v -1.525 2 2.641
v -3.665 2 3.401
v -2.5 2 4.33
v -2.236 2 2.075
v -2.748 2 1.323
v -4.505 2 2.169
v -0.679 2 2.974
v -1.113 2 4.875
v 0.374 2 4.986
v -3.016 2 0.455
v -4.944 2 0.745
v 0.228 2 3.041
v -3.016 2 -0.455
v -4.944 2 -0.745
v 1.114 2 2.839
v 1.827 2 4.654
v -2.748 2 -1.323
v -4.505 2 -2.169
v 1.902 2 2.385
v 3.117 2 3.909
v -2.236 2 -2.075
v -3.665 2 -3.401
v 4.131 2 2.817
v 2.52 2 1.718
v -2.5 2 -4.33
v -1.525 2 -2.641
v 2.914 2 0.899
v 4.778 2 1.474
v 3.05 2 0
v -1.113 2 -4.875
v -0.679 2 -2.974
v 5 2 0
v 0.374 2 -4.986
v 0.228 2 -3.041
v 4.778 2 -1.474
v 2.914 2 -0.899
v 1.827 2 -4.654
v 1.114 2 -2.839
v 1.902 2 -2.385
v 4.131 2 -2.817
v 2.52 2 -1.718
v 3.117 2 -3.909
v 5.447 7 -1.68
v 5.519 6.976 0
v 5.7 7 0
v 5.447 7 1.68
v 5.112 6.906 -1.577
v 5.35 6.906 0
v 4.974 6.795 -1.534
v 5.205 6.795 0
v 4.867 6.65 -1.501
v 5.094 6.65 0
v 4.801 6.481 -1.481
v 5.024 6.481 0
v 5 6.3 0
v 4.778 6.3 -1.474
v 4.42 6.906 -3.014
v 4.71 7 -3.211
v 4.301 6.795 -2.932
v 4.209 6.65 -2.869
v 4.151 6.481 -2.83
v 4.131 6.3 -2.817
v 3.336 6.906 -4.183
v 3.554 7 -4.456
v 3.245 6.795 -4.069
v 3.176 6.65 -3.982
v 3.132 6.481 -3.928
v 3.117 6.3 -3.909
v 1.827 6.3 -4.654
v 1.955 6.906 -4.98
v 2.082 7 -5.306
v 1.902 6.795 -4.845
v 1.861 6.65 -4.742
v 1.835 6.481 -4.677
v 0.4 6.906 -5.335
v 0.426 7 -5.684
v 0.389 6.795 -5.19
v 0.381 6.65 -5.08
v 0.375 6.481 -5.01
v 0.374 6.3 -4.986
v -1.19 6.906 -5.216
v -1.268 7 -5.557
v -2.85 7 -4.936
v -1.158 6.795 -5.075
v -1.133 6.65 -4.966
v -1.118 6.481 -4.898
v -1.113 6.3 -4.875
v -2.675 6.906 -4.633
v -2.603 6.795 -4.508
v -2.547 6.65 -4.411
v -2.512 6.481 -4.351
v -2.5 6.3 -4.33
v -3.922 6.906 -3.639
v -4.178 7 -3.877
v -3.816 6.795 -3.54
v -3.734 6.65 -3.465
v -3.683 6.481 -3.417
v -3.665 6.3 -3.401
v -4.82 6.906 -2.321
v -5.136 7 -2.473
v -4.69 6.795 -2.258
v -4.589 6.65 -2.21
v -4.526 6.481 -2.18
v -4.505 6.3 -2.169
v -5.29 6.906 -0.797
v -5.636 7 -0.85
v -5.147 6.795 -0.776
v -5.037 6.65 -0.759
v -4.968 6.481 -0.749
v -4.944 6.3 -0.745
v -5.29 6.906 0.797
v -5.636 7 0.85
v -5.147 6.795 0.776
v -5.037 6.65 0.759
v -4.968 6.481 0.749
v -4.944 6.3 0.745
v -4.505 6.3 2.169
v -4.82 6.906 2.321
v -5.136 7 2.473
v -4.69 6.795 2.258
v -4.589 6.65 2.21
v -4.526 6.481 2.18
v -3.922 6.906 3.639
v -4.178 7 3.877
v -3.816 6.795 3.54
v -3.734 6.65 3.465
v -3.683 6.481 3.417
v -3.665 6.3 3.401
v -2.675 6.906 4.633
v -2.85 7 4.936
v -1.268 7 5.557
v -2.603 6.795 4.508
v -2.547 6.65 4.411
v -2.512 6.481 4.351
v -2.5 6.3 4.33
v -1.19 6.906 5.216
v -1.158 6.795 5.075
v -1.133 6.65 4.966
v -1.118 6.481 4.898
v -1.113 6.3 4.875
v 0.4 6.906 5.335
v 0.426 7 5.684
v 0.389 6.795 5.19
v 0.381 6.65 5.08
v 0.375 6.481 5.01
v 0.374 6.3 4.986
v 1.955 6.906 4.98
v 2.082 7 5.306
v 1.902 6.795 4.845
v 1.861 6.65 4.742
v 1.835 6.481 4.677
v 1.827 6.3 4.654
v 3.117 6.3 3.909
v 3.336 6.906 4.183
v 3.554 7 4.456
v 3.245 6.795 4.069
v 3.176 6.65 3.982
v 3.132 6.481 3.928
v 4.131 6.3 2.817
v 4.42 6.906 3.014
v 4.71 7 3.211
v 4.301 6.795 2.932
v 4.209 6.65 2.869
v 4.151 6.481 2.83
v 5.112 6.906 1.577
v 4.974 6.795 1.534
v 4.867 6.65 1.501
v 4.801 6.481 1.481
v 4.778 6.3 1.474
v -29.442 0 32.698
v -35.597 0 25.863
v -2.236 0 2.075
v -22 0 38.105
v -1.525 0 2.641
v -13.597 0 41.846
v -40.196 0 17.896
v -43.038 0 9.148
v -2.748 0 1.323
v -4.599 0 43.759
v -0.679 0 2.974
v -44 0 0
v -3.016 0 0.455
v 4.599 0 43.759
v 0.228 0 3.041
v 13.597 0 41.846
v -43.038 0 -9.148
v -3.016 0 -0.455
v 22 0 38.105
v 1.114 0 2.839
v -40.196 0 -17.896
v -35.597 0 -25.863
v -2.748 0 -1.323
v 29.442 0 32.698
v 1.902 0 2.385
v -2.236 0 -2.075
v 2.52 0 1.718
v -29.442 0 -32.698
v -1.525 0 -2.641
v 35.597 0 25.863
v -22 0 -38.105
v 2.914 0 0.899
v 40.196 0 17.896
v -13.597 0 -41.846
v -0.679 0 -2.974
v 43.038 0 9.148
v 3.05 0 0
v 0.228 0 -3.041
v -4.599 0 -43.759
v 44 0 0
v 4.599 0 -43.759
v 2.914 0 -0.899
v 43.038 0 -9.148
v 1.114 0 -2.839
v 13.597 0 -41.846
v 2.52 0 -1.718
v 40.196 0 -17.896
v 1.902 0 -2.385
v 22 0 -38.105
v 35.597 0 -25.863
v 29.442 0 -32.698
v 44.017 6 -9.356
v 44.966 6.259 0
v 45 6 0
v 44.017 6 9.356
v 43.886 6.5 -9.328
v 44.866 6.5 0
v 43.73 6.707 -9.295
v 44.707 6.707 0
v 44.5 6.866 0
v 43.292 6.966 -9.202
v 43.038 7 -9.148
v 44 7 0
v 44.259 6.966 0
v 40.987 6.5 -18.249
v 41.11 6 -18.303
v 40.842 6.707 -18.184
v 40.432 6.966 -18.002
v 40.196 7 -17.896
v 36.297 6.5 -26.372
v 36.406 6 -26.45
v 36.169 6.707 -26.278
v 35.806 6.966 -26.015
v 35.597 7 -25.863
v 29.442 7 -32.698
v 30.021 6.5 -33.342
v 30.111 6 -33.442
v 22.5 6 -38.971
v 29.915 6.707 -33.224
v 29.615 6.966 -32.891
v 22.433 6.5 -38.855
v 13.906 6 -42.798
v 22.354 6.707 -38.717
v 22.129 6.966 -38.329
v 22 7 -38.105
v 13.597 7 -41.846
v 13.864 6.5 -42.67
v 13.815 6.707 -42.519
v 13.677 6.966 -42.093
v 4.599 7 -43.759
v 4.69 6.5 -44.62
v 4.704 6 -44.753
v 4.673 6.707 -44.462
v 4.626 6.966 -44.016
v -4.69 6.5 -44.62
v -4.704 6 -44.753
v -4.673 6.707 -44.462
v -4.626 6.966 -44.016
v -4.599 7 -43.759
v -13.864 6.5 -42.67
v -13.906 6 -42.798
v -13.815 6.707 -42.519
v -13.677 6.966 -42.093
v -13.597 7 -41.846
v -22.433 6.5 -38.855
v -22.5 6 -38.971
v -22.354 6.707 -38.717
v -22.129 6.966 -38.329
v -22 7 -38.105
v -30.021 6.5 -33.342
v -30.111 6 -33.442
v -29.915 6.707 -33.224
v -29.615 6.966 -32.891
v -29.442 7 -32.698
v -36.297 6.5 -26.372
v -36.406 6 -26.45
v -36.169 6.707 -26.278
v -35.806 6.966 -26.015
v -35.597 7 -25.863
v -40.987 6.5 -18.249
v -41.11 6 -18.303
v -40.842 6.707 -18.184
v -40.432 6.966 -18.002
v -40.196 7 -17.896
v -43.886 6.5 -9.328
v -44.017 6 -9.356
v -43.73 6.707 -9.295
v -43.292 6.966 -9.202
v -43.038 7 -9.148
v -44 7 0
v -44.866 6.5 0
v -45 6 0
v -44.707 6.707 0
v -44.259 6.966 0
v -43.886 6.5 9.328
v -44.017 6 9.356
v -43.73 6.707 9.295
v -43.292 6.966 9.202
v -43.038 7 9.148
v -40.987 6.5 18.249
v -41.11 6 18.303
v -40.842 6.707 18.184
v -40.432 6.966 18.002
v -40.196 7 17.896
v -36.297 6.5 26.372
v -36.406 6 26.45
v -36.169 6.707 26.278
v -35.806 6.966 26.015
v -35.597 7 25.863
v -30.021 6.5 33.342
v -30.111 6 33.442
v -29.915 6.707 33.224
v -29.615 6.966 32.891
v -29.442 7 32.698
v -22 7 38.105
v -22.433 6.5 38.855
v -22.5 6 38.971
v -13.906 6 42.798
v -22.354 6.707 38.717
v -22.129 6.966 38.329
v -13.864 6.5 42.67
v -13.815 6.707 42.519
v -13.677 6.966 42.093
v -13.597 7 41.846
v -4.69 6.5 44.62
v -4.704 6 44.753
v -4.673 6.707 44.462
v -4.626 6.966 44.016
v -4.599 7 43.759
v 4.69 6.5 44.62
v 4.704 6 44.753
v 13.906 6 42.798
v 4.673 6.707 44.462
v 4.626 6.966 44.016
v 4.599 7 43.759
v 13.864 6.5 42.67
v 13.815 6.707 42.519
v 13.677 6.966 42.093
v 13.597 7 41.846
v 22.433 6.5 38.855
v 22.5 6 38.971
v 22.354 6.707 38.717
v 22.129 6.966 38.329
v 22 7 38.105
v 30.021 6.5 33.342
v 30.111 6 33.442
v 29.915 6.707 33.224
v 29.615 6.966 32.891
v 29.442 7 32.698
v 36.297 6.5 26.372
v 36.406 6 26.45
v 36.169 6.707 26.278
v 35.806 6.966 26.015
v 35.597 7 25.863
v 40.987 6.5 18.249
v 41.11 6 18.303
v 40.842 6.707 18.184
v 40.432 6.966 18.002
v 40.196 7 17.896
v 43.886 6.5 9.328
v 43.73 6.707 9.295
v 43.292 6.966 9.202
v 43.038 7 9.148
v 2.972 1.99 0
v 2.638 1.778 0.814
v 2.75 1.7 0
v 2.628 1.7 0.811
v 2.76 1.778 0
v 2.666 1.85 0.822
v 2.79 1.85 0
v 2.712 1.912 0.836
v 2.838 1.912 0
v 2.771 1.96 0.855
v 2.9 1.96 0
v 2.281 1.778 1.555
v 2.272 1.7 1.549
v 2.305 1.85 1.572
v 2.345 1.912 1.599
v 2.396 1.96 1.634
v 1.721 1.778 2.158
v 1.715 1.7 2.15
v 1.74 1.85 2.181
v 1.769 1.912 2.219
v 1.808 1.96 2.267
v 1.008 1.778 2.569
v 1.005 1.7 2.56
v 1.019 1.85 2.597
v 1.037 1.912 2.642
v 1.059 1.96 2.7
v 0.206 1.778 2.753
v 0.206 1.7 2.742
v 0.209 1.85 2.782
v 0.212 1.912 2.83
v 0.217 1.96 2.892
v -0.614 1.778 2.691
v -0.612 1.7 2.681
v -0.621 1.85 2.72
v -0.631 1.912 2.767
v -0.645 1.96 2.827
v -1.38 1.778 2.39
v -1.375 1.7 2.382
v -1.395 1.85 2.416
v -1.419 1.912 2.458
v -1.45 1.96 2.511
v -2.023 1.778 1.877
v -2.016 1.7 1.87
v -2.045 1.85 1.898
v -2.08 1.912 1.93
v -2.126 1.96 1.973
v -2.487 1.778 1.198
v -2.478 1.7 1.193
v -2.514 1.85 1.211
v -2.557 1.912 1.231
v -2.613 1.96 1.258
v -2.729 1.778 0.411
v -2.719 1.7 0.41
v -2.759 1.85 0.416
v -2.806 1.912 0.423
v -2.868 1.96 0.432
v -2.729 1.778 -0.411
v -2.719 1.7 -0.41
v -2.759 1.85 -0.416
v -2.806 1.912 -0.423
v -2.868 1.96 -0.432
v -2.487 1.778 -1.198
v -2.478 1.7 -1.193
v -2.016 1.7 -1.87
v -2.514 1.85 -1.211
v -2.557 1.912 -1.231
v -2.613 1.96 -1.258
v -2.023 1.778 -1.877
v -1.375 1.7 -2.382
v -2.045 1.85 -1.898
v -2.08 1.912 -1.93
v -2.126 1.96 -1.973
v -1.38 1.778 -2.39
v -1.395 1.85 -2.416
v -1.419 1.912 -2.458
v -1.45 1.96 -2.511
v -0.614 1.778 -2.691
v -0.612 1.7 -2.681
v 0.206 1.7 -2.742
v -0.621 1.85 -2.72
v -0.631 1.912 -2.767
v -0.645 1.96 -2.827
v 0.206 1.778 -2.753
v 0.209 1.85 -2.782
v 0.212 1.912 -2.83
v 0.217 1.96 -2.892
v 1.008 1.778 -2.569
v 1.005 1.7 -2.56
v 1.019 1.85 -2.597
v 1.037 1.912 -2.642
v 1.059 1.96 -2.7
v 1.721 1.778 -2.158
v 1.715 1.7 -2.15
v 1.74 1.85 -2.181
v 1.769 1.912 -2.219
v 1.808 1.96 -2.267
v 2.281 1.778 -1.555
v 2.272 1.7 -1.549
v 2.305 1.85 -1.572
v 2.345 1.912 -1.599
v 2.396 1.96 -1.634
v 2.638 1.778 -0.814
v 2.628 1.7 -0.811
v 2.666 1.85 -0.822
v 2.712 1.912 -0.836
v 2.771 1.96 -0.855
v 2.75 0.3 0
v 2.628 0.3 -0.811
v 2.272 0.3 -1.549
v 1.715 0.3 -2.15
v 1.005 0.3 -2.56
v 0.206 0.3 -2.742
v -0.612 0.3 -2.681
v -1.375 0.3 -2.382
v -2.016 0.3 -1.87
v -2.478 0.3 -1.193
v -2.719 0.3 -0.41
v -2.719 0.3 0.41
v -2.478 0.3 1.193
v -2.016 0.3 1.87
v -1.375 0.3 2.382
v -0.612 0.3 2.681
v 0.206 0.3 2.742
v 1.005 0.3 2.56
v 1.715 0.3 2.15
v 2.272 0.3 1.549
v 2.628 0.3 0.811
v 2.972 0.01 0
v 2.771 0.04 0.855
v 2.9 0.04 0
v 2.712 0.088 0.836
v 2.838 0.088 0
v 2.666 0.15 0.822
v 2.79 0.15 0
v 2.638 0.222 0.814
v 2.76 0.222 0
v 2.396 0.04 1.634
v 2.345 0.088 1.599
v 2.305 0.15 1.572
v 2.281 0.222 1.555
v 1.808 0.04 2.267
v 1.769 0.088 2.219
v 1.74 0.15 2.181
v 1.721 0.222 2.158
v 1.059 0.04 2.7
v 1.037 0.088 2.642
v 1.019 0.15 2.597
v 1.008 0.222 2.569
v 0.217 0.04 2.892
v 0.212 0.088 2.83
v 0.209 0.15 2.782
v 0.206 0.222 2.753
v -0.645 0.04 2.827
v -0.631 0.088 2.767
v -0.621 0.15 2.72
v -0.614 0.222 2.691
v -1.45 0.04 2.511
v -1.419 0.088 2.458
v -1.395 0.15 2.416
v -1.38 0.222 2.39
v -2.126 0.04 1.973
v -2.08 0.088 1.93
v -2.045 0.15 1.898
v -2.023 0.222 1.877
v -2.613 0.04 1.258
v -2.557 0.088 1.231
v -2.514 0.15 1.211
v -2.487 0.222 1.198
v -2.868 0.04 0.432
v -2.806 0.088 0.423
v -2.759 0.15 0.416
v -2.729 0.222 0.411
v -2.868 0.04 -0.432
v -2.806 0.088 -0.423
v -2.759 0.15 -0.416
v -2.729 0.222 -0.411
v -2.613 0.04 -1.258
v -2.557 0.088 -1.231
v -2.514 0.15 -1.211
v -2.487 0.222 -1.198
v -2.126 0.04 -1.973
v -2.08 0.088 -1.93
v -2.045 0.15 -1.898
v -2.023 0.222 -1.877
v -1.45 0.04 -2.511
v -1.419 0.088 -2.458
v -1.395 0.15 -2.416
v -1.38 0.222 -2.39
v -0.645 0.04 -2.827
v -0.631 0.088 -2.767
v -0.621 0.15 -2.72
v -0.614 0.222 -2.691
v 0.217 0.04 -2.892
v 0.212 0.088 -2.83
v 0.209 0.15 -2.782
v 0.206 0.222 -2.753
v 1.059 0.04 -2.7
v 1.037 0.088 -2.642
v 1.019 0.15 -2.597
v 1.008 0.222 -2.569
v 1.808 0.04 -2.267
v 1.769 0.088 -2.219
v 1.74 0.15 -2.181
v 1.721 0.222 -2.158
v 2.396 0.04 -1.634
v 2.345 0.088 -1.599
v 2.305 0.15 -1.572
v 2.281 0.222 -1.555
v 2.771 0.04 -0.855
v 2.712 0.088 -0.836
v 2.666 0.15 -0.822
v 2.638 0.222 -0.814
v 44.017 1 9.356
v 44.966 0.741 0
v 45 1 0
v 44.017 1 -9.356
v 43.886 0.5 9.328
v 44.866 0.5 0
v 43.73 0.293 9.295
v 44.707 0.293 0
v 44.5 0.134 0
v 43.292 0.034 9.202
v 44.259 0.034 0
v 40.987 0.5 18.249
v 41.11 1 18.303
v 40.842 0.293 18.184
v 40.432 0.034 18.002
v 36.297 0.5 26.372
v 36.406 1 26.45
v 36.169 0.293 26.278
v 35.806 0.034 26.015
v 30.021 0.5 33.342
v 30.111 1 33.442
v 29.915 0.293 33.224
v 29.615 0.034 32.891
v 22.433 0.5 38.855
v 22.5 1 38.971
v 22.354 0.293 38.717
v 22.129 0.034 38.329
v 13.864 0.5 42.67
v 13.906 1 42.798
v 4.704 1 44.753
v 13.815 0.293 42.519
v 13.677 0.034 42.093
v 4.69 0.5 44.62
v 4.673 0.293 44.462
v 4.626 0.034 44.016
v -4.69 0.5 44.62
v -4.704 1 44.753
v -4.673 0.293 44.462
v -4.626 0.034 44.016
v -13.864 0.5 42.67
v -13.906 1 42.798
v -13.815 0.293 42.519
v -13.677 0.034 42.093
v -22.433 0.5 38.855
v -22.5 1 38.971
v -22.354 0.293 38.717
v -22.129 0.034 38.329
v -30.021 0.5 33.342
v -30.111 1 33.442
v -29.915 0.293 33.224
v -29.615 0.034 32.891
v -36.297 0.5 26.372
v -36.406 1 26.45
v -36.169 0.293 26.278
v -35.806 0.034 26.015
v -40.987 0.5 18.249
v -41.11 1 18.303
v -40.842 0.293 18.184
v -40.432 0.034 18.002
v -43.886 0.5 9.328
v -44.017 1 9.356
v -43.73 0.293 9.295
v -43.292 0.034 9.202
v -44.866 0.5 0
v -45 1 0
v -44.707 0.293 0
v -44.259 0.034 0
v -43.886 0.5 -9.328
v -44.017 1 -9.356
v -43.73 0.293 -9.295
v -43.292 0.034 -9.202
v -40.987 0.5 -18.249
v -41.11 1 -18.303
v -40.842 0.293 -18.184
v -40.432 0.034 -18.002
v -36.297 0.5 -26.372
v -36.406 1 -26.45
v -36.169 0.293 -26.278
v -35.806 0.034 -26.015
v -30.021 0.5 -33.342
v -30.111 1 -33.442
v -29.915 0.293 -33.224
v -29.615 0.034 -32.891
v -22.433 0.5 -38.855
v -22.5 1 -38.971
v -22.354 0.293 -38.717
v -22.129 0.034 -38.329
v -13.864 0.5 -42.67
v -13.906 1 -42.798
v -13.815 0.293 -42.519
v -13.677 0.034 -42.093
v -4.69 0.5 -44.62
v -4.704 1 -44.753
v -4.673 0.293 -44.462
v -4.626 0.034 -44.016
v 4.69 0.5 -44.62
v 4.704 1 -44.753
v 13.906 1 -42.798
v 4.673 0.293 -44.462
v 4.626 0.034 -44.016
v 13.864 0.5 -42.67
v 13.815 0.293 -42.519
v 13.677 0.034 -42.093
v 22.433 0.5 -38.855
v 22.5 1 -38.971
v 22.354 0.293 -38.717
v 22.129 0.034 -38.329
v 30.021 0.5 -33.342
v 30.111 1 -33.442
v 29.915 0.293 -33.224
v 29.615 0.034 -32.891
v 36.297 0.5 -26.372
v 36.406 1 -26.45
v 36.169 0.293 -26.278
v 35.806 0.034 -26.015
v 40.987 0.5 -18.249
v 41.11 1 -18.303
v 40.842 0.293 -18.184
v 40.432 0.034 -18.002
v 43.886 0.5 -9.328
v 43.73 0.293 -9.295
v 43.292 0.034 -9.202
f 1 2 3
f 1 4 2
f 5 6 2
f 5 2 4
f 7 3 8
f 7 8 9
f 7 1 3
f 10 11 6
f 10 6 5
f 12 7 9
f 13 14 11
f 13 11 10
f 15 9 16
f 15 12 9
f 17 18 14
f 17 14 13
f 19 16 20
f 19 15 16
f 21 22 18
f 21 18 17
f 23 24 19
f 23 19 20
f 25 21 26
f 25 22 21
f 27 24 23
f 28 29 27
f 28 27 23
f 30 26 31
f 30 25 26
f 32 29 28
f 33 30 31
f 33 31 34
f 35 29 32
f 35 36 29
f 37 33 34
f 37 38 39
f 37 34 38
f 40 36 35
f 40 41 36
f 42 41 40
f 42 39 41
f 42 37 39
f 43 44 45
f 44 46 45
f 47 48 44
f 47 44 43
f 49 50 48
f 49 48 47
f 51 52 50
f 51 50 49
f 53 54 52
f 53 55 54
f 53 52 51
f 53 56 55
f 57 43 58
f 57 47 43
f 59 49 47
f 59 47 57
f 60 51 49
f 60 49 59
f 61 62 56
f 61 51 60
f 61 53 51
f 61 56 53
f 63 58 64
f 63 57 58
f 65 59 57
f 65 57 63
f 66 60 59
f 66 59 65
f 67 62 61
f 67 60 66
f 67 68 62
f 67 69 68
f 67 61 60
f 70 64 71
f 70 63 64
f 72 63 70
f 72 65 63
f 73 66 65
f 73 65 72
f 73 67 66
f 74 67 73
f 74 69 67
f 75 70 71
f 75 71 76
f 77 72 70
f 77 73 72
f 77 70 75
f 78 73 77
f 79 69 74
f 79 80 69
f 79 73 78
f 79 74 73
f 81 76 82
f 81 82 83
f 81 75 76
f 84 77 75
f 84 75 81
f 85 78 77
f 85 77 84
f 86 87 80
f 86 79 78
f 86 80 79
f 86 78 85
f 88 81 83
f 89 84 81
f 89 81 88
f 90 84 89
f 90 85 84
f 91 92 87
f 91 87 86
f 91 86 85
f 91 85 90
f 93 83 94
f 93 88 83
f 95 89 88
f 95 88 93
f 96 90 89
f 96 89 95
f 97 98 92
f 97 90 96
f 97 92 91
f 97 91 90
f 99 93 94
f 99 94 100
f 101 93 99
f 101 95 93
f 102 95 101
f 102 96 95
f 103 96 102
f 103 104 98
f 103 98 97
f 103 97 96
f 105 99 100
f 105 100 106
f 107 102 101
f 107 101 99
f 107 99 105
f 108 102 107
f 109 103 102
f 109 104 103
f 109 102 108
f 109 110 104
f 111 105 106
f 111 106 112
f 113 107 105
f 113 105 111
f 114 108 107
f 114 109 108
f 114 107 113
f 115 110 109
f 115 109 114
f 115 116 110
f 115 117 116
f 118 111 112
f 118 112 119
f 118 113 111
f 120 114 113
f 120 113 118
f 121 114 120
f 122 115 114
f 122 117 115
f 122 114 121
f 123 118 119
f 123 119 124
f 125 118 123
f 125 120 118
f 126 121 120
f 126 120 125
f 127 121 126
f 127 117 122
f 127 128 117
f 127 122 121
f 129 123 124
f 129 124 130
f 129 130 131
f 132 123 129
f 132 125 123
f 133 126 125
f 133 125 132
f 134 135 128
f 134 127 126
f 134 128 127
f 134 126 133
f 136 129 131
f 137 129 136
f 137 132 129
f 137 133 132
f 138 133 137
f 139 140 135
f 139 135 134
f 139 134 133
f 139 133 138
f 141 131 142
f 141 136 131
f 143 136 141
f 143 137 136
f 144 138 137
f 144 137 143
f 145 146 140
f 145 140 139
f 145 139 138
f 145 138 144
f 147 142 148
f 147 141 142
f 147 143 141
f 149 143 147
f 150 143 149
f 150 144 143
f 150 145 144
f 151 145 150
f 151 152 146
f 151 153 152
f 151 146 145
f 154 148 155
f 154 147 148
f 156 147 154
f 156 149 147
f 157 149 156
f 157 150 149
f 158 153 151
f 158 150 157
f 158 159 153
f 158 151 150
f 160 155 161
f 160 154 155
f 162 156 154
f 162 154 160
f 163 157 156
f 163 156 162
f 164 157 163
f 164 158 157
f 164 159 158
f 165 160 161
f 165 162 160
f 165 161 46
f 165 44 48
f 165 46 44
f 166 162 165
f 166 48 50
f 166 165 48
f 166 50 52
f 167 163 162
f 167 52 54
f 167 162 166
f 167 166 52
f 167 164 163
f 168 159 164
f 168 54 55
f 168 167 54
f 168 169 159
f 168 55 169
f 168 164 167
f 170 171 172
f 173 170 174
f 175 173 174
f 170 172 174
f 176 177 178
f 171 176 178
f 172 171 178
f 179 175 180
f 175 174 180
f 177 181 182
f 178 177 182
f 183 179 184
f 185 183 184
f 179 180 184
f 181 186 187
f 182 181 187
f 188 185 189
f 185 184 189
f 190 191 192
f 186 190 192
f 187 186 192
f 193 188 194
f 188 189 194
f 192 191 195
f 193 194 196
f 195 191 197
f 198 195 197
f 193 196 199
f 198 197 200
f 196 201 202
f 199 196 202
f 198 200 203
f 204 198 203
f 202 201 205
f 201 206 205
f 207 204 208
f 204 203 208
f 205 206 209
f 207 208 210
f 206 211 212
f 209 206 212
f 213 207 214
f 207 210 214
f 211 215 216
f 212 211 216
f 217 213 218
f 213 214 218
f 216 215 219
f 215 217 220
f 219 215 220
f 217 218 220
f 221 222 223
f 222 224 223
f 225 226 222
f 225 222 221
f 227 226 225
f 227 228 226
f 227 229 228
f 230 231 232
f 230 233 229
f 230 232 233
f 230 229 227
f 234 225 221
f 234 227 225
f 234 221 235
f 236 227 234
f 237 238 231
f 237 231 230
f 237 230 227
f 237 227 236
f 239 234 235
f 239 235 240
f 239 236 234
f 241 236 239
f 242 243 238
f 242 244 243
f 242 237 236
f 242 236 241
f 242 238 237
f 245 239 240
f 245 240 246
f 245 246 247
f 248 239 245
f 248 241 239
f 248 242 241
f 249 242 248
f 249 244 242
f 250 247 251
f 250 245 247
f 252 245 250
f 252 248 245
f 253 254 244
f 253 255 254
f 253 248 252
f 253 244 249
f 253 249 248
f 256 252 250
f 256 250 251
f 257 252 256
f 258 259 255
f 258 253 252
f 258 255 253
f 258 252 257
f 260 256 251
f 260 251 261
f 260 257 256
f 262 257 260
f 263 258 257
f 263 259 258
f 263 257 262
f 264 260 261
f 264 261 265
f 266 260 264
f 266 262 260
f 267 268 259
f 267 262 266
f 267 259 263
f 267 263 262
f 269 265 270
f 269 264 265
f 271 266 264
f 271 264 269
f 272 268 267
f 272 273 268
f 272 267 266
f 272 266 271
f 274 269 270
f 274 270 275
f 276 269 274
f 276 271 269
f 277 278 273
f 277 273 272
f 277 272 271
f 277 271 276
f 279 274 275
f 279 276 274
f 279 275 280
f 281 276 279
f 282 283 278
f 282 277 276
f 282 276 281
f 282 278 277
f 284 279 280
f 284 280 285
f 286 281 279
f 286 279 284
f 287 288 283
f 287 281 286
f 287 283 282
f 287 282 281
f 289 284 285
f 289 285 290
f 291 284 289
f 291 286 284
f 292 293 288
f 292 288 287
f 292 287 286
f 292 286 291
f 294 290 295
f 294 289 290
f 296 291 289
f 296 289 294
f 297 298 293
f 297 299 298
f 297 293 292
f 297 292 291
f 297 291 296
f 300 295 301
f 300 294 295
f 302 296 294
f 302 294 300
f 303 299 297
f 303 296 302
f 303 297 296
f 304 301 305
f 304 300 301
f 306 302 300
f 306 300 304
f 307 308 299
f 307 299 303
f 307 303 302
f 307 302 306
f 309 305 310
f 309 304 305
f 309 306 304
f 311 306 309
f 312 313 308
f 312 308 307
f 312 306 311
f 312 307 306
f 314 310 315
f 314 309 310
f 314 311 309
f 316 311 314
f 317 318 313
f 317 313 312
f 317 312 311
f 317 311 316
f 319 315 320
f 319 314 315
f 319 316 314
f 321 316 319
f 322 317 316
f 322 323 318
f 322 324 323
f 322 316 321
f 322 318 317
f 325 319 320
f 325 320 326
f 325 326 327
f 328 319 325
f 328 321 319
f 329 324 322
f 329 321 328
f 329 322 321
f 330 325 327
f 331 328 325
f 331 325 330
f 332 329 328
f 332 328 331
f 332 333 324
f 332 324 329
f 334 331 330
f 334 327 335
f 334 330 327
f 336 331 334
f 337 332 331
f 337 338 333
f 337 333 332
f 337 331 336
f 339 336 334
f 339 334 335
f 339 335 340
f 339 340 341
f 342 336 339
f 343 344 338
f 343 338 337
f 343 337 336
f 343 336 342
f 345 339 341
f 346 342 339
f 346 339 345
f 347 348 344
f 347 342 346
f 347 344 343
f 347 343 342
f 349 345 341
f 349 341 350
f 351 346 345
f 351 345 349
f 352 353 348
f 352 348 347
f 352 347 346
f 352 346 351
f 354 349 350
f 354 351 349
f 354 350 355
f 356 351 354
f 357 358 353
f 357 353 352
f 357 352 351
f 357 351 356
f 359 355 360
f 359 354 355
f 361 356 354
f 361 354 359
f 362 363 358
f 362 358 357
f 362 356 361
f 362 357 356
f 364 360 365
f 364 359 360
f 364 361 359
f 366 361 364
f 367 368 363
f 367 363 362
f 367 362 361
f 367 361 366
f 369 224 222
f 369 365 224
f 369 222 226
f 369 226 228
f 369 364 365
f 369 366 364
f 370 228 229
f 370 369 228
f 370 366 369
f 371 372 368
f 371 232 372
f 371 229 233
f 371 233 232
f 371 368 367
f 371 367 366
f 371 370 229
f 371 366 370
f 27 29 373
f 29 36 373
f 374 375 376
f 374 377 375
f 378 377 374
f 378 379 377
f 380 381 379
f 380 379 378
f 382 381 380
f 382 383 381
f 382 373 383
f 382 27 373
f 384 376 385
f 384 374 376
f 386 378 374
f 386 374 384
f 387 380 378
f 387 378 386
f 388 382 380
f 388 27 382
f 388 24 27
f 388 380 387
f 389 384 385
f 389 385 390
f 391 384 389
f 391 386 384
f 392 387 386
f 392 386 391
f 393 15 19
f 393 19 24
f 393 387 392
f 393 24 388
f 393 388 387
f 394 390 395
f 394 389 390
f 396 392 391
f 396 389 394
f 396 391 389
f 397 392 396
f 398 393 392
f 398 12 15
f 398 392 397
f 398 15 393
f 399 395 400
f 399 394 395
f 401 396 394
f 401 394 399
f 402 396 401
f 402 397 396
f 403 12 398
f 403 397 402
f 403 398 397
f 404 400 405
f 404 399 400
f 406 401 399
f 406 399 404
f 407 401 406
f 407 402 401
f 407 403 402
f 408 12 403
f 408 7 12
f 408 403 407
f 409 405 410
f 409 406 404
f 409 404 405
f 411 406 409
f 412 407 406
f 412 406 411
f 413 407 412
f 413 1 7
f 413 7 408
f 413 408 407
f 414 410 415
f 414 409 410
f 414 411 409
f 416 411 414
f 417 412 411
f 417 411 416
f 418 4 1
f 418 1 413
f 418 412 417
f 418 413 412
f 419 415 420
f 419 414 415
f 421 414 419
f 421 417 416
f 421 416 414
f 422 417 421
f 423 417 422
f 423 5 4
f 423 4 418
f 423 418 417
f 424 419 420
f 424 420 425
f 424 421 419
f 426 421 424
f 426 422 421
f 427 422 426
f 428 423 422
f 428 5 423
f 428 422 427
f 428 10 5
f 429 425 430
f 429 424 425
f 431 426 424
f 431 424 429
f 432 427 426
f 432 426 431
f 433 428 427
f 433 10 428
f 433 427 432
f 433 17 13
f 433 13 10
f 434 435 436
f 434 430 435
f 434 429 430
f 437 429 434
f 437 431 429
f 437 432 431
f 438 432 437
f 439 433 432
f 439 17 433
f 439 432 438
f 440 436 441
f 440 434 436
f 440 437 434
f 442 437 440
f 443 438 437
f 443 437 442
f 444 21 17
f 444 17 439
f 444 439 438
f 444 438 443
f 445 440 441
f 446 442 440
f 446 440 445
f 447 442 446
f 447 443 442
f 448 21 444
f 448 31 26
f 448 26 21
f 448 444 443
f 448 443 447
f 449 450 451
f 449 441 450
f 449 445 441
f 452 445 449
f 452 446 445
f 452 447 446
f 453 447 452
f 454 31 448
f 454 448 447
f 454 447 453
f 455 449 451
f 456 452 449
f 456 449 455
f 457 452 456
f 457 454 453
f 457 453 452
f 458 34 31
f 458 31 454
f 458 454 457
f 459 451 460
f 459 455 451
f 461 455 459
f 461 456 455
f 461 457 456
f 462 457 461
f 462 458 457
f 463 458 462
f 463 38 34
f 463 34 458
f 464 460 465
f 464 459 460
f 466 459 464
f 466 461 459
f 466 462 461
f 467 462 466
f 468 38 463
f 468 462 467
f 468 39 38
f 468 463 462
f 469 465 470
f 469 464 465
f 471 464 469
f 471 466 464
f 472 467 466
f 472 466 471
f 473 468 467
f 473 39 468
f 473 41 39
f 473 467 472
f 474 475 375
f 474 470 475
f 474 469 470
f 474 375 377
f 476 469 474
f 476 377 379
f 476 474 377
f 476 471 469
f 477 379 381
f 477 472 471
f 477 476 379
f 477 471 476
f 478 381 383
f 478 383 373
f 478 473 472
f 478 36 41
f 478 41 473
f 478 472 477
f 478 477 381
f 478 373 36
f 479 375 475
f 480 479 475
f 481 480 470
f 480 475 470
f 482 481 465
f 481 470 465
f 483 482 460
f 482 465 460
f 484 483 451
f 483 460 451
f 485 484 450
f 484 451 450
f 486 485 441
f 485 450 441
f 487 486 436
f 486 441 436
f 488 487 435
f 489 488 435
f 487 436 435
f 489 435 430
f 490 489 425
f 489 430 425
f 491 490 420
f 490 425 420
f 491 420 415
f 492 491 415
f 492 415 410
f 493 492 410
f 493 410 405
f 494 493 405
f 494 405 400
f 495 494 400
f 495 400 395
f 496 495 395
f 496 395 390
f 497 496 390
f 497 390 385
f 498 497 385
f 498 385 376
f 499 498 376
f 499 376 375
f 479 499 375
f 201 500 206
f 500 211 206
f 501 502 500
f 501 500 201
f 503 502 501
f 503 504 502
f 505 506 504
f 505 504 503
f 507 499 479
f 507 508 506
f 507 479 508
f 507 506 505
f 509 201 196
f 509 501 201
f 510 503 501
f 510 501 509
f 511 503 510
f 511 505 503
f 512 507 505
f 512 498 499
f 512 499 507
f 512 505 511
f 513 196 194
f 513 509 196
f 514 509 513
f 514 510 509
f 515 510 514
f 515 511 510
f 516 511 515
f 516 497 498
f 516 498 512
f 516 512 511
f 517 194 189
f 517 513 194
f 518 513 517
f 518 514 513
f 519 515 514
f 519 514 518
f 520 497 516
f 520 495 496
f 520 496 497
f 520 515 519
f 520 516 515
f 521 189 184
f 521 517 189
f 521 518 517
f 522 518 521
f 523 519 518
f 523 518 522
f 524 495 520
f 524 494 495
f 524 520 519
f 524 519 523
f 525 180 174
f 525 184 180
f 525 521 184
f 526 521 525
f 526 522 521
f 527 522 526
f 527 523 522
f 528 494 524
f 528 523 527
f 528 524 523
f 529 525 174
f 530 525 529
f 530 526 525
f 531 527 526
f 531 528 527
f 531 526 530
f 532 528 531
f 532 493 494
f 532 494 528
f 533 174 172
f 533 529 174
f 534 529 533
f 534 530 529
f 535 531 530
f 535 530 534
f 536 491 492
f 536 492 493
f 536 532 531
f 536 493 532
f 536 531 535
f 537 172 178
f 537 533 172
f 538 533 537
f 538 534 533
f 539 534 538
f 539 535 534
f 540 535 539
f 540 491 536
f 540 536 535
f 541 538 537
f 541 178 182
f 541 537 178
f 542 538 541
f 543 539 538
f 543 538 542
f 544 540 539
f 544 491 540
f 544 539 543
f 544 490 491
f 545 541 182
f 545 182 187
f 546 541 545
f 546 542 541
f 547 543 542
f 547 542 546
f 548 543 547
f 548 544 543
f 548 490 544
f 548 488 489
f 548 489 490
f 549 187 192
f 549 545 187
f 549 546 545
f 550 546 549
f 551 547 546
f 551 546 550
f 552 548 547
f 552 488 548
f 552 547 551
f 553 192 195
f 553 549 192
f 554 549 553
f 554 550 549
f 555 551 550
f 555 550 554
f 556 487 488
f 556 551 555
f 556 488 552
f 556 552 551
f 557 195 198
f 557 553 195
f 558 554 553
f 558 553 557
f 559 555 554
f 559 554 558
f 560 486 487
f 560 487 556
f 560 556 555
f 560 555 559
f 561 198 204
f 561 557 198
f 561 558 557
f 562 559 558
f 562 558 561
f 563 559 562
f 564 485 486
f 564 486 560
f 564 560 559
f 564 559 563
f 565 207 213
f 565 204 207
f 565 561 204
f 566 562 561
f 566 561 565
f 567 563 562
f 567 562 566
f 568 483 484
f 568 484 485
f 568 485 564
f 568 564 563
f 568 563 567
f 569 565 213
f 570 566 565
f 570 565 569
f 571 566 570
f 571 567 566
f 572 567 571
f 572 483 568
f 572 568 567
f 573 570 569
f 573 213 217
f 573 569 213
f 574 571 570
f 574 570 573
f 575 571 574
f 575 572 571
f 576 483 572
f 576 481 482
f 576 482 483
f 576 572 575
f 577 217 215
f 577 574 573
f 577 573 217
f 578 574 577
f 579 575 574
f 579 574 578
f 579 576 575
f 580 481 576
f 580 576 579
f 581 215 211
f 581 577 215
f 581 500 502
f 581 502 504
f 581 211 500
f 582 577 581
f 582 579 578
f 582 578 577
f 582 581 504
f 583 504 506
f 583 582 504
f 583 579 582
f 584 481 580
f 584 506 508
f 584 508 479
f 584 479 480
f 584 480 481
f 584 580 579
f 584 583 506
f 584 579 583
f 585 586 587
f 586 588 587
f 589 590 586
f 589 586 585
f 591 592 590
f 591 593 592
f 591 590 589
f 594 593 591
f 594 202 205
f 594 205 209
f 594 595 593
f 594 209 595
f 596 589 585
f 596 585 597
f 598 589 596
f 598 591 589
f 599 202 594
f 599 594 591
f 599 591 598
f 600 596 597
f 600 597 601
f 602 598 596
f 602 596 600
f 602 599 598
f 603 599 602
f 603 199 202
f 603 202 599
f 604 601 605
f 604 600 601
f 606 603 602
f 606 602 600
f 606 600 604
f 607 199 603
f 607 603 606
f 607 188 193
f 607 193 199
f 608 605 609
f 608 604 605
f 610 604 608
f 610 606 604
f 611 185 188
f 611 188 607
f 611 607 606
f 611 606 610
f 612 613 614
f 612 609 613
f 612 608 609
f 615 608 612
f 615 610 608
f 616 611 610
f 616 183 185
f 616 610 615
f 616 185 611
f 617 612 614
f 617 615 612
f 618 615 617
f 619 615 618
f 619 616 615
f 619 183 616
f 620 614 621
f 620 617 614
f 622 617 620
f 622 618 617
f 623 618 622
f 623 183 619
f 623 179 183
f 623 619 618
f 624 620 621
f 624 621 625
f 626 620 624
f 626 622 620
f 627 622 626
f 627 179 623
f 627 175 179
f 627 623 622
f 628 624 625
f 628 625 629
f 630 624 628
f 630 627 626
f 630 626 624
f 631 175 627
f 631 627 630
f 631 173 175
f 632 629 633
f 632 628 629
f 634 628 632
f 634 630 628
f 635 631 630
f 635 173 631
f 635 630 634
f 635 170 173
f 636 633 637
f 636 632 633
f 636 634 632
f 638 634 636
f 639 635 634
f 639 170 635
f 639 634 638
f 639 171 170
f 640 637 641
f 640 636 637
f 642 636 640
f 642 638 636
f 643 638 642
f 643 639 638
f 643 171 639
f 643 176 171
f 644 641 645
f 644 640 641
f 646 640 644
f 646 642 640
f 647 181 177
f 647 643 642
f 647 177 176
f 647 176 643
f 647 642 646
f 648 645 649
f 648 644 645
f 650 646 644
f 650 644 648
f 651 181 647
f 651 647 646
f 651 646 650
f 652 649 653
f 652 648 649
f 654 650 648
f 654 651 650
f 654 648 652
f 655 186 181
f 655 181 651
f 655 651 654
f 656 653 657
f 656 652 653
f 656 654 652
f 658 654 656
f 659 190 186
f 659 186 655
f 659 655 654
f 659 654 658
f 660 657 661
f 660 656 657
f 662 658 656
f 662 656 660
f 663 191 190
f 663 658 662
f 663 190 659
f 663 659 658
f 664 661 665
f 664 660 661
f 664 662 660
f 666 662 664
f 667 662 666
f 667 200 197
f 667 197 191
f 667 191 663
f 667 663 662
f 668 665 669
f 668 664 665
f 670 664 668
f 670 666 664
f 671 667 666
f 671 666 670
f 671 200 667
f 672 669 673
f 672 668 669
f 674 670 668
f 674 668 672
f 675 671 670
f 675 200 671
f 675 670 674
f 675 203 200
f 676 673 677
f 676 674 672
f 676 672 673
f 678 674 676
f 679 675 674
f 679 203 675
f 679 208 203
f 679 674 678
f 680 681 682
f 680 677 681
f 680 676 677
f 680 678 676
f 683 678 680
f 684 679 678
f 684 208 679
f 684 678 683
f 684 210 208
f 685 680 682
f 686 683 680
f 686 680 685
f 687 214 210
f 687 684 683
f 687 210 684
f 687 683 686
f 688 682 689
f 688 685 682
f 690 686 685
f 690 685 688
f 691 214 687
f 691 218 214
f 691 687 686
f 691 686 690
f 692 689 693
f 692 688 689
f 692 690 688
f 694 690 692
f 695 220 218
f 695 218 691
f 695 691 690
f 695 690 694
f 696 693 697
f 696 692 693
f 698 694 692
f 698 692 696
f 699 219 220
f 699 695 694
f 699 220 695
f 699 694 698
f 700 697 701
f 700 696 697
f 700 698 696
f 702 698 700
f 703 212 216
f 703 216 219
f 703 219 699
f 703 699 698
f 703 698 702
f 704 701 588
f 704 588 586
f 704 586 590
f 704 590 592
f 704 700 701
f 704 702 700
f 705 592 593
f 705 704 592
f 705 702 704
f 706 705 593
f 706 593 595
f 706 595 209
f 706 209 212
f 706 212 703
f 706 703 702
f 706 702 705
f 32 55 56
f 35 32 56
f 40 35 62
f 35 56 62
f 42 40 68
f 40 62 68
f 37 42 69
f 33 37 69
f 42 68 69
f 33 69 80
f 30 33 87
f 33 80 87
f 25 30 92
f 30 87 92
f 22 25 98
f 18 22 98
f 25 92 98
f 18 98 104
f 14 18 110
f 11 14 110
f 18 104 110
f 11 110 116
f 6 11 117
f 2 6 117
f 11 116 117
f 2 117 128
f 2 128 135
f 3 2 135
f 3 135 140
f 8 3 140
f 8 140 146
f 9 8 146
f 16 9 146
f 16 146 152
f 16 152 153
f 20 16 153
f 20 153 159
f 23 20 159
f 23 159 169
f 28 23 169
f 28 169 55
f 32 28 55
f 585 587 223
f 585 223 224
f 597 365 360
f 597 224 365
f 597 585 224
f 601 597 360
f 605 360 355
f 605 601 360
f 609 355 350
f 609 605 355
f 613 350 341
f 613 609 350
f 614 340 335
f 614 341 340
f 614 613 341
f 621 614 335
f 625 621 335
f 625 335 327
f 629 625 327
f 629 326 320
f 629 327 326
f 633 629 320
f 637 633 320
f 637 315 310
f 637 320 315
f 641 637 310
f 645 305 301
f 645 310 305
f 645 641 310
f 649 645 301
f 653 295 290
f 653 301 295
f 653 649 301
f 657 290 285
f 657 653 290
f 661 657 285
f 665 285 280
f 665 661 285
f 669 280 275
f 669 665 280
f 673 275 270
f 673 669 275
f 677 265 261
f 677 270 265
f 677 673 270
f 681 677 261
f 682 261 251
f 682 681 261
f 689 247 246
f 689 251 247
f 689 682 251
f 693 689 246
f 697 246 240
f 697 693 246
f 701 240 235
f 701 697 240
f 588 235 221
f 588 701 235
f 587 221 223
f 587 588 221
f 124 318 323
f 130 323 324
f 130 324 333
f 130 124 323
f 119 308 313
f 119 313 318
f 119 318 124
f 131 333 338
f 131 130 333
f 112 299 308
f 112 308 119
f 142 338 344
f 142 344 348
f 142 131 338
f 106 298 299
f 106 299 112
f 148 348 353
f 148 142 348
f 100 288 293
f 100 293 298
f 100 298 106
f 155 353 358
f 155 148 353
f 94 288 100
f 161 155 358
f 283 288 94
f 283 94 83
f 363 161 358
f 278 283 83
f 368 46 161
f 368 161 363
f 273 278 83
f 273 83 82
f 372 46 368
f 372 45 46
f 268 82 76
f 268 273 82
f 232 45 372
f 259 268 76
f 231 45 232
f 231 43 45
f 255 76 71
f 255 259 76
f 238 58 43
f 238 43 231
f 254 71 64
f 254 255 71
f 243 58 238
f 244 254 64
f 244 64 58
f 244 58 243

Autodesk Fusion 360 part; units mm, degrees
sketch "Skizze1" plane through (0, 0, 0) normal (0, 1, 0) x (1, 0, 0)
  circle A0 centre (0, 0) radius 45
  dimension "d1" = 90
extrude "Extrusion1" add sketch "Skizze1" along normal blind 7
cylinder "Grundkörper Zylinder1" cut diameter 5.5 height -10 placed x (1, 0, 0) y (0, 0, -1) z (0, 1, 0) at (0, 7, 0)
cylinder "Grundkörper Zylinder2" cut diameter 10 height -5 placed x (1, 0, 0) y (0, 0, -1) z (0, 1, 0) at (0, 7, 0)
fillet "Abrundung1" radius 1 2 edges at (-41.9547, 0, 16.2727) (-41.9547, 7, 16.2727)
fillet "Abrundung2" radius 0.3 2 edges at (0.9944, 0, 2.5639) (0.9944, 2, 2.5639)
fillet "Abrundung3" radius 0.7 1 edges at (-1.8081, 7, 4.6616)
